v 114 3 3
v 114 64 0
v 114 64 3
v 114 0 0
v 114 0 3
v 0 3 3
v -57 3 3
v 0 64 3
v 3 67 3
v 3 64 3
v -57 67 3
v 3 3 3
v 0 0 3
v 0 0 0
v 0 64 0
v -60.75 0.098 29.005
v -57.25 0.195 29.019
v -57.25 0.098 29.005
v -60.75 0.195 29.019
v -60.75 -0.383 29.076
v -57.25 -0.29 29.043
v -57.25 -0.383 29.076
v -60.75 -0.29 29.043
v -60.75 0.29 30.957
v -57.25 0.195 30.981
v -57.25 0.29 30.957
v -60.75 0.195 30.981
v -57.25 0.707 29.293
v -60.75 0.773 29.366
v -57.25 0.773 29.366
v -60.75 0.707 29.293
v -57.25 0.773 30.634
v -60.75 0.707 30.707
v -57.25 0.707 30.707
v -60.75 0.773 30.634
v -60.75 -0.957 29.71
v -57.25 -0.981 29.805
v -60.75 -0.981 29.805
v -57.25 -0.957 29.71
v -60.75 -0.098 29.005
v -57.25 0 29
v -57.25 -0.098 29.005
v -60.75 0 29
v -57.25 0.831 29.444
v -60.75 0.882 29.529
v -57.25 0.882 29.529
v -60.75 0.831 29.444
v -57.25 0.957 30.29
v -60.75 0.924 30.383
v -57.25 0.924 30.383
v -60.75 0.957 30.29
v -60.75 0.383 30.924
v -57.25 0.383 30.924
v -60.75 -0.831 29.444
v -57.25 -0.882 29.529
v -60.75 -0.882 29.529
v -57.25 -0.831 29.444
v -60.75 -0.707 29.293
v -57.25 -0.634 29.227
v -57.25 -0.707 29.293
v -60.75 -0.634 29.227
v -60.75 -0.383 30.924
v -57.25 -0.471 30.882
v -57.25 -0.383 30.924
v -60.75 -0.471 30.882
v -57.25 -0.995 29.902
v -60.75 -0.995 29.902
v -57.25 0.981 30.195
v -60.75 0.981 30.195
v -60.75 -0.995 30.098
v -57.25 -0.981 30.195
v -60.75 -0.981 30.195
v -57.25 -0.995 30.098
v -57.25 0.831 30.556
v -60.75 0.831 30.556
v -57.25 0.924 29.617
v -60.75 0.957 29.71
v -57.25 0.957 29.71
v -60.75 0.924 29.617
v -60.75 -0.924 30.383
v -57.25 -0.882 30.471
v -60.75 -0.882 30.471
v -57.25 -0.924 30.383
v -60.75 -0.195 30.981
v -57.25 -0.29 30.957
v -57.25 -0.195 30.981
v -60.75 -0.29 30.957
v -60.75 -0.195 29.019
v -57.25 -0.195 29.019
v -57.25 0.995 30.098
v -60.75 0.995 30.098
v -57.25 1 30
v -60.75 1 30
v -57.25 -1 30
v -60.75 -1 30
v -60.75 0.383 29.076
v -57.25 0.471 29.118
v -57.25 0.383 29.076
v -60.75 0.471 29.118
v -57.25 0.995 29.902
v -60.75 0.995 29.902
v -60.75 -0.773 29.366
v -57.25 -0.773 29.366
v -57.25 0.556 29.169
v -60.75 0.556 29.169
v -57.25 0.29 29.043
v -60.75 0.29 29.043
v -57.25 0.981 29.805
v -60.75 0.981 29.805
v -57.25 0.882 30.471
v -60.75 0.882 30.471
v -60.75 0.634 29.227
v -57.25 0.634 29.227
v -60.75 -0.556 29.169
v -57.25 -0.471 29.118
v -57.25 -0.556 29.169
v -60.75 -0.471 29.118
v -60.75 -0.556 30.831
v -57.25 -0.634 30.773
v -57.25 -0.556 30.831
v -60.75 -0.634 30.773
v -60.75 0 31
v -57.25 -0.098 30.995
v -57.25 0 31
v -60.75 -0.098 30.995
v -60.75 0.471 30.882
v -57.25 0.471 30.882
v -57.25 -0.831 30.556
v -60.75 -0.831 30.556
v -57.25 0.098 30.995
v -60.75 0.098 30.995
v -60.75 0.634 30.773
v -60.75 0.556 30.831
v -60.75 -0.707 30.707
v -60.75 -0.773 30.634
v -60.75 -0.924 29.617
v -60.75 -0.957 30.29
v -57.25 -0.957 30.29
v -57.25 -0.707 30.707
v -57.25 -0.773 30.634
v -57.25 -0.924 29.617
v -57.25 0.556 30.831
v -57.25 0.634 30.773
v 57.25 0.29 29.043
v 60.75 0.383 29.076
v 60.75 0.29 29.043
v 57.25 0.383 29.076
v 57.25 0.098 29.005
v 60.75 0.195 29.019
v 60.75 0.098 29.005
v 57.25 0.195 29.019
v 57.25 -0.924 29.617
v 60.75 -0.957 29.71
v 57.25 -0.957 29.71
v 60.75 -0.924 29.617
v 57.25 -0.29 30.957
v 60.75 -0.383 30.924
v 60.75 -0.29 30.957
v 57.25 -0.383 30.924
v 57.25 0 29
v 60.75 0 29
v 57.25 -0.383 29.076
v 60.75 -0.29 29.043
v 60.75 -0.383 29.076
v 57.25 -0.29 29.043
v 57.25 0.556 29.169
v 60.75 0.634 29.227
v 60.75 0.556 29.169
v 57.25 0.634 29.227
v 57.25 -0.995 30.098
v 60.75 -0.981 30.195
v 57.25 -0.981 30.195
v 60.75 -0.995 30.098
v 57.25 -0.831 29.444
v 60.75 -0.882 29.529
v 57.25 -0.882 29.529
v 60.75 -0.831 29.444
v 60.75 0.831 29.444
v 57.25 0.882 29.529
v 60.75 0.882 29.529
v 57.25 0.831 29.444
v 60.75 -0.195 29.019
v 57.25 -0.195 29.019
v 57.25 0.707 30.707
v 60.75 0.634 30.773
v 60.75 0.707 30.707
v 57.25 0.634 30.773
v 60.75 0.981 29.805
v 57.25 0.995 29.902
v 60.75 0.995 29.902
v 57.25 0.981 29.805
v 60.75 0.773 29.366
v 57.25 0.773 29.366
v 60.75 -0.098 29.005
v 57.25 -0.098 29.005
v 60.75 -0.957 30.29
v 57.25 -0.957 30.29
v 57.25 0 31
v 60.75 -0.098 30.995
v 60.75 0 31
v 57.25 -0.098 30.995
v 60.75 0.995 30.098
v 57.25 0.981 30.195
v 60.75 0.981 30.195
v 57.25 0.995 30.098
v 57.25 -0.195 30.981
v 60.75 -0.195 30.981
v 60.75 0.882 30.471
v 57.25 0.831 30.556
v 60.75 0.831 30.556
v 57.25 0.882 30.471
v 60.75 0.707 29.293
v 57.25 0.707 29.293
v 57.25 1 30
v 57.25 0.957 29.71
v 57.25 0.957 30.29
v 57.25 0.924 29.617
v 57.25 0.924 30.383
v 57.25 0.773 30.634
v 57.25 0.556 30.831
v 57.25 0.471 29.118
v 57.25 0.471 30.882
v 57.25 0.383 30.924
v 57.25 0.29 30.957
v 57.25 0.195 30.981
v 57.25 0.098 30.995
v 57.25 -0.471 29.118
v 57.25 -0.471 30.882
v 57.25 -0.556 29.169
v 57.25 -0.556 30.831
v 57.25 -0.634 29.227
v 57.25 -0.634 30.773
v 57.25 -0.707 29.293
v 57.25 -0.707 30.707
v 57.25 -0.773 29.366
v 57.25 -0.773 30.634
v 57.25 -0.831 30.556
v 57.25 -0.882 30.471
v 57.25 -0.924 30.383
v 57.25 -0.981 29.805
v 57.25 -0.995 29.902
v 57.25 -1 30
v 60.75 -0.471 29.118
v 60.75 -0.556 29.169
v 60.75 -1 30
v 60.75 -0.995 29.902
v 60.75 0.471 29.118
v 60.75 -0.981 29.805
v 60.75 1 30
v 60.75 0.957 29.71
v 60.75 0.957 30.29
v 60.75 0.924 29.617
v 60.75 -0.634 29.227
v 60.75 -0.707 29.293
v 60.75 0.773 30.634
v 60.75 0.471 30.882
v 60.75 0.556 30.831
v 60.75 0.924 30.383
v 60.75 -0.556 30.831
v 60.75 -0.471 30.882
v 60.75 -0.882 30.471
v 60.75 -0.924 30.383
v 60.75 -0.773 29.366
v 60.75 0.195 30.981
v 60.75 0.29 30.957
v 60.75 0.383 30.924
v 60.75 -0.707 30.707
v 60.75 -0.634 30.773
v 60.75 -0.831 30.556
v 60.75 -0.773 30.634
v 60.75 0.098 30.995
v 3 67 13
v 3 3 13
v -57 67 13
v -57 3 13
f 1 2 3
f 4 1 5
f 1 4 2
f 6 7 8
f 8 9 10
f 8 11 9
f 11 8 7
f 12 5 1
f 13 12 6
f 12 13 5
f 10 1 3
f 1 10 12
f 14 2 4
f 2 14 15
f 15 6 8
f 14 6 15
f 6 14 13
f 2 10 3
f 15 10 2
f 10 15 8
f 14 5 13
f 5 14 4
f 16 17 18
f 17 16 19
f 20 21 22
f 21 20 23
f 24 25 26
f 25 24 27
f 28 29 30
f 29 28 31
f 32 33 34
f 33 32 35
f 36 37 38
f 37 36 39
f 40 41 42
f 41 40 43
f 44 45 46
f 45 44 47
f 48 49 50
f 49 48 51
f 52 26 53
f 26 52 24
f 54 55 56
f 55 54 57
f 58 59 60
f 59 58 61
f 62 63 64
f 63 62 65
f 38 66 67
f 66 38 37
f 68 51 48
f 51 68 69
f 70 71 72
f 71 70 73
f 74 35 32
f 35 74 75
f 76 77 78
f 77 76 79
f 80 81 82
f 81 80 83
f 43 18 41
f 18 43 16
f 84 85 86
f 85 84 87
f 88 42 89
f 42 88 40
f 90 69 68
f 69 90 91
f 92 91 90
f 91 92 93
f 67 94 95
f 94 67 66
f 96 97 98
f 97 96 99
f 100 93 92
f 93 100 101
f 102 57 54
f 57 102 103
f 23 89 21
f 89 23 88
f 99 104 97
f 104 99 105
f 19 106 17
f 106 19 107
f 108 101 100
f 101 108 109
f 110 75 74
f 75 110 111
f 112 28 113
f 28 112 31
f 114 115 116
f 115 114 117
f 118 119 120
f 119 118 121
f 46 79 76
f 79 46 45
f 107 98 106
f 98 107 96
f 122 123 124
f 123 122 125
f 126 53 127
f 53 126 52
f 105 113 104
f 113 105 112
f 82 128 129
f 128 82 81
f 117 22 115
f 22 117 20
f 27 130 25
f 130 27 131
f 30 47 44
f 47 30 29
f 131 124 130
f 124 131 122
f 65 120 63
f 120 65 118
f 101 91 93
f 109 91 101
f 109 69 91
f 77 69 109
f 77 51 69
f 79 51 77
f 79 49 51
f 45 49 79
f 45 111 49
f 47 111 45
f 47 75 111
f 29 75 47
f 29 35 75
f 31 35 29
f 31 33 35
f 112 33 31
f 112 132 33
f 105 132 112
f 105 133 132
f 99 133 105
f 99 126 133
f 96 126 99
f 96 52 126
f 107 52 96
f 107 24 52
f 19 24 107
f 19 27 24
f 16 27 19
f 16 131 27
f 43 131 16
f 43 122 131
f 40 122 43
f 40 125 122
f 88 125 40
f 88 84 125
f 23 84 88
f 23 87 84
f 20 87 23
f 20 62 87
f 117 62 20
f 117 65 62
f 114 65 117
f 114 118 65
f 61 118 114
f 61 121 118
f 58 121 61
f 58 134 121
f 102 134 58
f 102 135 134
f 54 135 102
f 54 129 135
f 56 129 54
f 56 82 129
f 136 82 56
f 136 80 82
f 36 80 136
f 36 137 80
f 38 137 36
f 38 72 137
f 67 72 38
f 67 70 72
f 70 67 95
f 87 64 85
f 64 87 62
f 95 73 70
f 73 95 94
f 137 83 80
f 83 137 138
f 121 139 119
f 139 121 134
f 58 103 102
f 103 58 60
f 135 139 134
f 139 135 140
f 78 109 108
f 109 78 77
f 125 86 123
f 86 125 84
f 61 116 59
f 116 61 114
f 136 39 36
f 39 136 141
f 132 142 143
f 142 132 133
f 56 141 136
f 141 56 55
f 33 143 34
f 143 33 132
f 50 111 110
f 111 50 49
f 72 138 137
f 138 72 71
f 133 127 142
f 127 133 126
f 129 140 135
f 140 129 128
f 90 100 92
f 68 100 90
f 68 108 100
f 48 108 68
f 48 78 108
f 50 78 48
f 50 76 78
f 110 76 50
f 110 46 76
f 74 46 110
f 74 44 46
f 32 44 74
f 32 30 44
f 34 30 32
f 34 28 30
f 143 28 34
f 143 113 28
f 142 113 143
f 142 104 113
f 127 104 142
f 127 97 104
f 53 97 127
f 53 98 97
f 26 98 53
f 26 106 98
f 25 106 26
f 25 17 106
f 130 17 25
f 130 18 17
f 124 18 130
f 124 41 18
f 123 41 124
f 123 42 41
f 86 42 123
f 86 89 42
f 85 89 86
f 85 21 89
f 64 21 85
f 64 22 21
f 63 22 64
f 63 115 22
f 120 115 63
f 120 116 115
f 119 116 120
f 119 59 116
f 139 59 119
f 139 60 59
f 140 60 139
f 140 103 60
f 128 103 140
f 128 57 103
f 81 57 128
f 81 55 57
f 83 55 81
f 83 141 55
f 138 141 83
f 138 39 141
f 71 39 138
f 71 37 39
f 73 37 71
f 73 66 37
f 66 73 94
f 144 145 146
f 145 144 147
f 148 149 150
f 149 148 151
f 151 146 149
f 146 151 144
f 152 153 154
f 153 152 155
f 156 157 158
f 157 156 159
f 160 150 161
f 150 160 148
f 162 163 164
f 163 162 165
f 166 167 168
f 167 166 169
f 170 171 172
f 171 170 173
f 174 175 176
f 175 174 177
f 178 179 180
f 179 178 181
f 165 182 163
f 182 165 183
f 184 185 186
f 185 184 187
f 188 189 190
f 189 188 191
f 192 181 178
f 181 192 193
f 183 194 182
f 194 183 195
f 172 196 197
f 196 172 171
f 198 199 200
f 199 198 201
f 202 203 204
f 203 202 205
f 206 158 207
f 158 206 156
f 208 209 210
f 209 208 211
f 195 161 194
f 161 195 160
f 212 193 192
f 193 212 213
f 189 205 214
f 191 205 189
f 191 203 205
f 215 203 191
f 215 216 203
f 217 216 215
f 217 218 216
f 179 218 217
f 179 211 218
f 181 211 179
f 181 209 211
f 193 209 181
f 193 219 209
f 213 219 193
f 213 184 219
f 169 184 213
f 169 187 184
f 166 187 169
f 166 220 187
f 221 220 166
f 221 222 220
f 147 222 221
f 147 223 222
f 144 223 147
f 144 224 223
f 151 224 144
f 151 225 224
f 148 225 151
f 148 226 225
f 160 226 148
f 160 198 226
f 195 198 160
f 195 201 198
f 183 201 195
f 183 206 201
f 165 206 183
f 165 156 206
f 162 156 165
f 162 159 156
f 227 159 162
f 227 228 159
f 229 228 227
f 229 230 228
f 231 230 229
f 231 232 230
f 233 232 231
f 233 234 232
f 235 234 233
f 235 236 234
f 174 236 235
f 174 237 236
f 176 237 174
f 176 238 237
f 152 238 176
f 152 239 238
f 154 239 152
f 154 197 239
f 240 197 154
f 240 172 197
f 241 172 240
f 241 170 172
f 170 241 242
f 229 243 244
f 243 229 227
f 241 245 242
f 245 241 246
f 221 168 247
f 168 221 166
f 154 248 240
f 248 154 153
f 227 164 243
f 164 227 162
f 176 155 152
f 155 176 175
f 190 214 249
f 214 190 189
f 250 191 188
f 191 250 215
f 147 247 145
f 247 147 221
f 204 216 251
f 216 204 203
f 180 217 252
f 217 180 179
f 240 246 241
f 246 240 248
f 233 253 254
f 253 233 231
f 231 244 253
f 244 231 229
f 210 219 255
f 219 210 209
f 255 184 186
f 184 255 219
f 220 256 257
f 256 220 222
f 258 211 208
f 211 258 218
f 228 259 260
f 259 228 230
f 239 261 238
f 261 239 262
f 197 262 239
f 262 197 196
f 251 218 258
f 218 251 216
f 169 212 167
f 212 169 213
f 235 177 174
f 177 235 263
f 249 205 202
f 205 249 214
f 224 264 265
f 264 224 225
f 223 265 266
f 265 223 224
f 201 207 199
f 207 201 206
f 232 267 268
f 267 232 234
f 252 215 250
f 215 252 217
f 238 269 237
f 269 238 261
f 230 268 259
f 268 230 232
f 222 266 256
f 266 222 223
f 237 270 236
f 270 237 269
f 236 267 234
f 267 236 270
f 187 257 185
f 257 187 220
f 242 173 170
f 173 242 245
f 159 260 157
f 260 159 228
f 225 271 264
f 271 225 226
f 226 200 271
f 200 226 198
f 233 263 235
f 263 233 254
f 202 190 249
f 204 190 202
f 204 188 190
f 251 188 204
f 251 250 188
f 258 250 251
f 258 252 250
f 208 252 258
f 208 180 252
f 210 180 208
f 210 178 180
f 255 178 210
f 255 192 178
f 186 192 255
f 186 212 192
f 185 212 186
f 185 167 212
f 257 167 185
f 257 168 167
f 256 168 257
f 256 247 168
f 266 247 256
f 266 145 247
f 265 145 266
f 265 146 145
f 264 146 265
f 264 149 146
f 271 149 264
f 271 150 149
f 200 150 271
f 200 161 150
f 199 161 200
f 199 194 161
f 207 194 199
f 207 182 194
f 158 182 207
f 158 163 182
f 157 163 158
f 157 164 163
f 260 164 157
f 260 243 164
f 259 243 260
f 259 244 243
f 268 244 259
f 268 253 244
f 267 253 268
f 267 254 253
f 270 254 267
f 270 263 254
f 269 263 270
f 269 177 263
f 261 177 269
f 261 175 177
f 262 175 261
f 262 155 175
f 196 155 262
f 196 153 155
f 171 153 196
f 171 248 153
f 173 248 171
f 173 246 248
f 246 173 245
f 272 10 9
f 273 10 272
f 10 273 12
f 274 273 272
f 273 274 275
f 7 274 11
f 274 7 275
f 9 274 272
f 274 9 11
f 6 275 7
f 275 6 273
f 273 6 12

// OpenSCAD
// Mini horizontal gel-electrophoresis box: buffer tank with central gel-platform
// Print orientation: tank rests on XY plane, builds up in +Z, open top

$fn = 64;

// ---- Tank ----
tank_x      = 120;   // outer length (X)
tank_y      = 70;    // outer width (Y)
tank_h      = 40;    // outer height (Z)
wall        = 3;     // wall thickness
floor       = 3;     // floor thickness

// ---- Platform ----
plat_x      = 60;    // platform length in X, centred
plat_top_z  = 13;    // platform top height above tank bottom (floor + inner floor)

// ---- Electrode holes ----
hole_d      = 2;     // horizontal hole diameter (through end walls)
hole_y      = 0;     // hole centre Y
hole_z      = 30;    // hole centre Z

// ---- Derived ----
tank_in_x   = tank_x - 2*wall;
tank_in_y   = tank_y - 2*wall;
plat_h      = plat_top_z - floor;   // platform height above floor
eps         = 0.5;                  // cutter overshoot

union() {
    // Tank body (floor + side walls, open top)
    difference() {
        cube([tank_in_x, tank_in_y, floor]);
        translate([wall, wall, floor])
            cube([tank_in_x, tank_in_y, tank_h - floor]);
    }

    // Central gel platform, full inner width, through the walls
    translate([-tank_x/2 + wall, wall, floor])
        cube([plat_x, tank_in_y, plat_h]);

    // Horizontal electrode holes through each end wall
    for (sx = [-1, 1])
        translate([sx * (tank_x/2 - hole_d/2), hole_y, hole_z])
            rotate([0, 90, 0])
                cylinder(d = hole_d, h = wall + eps, center = true);
}
